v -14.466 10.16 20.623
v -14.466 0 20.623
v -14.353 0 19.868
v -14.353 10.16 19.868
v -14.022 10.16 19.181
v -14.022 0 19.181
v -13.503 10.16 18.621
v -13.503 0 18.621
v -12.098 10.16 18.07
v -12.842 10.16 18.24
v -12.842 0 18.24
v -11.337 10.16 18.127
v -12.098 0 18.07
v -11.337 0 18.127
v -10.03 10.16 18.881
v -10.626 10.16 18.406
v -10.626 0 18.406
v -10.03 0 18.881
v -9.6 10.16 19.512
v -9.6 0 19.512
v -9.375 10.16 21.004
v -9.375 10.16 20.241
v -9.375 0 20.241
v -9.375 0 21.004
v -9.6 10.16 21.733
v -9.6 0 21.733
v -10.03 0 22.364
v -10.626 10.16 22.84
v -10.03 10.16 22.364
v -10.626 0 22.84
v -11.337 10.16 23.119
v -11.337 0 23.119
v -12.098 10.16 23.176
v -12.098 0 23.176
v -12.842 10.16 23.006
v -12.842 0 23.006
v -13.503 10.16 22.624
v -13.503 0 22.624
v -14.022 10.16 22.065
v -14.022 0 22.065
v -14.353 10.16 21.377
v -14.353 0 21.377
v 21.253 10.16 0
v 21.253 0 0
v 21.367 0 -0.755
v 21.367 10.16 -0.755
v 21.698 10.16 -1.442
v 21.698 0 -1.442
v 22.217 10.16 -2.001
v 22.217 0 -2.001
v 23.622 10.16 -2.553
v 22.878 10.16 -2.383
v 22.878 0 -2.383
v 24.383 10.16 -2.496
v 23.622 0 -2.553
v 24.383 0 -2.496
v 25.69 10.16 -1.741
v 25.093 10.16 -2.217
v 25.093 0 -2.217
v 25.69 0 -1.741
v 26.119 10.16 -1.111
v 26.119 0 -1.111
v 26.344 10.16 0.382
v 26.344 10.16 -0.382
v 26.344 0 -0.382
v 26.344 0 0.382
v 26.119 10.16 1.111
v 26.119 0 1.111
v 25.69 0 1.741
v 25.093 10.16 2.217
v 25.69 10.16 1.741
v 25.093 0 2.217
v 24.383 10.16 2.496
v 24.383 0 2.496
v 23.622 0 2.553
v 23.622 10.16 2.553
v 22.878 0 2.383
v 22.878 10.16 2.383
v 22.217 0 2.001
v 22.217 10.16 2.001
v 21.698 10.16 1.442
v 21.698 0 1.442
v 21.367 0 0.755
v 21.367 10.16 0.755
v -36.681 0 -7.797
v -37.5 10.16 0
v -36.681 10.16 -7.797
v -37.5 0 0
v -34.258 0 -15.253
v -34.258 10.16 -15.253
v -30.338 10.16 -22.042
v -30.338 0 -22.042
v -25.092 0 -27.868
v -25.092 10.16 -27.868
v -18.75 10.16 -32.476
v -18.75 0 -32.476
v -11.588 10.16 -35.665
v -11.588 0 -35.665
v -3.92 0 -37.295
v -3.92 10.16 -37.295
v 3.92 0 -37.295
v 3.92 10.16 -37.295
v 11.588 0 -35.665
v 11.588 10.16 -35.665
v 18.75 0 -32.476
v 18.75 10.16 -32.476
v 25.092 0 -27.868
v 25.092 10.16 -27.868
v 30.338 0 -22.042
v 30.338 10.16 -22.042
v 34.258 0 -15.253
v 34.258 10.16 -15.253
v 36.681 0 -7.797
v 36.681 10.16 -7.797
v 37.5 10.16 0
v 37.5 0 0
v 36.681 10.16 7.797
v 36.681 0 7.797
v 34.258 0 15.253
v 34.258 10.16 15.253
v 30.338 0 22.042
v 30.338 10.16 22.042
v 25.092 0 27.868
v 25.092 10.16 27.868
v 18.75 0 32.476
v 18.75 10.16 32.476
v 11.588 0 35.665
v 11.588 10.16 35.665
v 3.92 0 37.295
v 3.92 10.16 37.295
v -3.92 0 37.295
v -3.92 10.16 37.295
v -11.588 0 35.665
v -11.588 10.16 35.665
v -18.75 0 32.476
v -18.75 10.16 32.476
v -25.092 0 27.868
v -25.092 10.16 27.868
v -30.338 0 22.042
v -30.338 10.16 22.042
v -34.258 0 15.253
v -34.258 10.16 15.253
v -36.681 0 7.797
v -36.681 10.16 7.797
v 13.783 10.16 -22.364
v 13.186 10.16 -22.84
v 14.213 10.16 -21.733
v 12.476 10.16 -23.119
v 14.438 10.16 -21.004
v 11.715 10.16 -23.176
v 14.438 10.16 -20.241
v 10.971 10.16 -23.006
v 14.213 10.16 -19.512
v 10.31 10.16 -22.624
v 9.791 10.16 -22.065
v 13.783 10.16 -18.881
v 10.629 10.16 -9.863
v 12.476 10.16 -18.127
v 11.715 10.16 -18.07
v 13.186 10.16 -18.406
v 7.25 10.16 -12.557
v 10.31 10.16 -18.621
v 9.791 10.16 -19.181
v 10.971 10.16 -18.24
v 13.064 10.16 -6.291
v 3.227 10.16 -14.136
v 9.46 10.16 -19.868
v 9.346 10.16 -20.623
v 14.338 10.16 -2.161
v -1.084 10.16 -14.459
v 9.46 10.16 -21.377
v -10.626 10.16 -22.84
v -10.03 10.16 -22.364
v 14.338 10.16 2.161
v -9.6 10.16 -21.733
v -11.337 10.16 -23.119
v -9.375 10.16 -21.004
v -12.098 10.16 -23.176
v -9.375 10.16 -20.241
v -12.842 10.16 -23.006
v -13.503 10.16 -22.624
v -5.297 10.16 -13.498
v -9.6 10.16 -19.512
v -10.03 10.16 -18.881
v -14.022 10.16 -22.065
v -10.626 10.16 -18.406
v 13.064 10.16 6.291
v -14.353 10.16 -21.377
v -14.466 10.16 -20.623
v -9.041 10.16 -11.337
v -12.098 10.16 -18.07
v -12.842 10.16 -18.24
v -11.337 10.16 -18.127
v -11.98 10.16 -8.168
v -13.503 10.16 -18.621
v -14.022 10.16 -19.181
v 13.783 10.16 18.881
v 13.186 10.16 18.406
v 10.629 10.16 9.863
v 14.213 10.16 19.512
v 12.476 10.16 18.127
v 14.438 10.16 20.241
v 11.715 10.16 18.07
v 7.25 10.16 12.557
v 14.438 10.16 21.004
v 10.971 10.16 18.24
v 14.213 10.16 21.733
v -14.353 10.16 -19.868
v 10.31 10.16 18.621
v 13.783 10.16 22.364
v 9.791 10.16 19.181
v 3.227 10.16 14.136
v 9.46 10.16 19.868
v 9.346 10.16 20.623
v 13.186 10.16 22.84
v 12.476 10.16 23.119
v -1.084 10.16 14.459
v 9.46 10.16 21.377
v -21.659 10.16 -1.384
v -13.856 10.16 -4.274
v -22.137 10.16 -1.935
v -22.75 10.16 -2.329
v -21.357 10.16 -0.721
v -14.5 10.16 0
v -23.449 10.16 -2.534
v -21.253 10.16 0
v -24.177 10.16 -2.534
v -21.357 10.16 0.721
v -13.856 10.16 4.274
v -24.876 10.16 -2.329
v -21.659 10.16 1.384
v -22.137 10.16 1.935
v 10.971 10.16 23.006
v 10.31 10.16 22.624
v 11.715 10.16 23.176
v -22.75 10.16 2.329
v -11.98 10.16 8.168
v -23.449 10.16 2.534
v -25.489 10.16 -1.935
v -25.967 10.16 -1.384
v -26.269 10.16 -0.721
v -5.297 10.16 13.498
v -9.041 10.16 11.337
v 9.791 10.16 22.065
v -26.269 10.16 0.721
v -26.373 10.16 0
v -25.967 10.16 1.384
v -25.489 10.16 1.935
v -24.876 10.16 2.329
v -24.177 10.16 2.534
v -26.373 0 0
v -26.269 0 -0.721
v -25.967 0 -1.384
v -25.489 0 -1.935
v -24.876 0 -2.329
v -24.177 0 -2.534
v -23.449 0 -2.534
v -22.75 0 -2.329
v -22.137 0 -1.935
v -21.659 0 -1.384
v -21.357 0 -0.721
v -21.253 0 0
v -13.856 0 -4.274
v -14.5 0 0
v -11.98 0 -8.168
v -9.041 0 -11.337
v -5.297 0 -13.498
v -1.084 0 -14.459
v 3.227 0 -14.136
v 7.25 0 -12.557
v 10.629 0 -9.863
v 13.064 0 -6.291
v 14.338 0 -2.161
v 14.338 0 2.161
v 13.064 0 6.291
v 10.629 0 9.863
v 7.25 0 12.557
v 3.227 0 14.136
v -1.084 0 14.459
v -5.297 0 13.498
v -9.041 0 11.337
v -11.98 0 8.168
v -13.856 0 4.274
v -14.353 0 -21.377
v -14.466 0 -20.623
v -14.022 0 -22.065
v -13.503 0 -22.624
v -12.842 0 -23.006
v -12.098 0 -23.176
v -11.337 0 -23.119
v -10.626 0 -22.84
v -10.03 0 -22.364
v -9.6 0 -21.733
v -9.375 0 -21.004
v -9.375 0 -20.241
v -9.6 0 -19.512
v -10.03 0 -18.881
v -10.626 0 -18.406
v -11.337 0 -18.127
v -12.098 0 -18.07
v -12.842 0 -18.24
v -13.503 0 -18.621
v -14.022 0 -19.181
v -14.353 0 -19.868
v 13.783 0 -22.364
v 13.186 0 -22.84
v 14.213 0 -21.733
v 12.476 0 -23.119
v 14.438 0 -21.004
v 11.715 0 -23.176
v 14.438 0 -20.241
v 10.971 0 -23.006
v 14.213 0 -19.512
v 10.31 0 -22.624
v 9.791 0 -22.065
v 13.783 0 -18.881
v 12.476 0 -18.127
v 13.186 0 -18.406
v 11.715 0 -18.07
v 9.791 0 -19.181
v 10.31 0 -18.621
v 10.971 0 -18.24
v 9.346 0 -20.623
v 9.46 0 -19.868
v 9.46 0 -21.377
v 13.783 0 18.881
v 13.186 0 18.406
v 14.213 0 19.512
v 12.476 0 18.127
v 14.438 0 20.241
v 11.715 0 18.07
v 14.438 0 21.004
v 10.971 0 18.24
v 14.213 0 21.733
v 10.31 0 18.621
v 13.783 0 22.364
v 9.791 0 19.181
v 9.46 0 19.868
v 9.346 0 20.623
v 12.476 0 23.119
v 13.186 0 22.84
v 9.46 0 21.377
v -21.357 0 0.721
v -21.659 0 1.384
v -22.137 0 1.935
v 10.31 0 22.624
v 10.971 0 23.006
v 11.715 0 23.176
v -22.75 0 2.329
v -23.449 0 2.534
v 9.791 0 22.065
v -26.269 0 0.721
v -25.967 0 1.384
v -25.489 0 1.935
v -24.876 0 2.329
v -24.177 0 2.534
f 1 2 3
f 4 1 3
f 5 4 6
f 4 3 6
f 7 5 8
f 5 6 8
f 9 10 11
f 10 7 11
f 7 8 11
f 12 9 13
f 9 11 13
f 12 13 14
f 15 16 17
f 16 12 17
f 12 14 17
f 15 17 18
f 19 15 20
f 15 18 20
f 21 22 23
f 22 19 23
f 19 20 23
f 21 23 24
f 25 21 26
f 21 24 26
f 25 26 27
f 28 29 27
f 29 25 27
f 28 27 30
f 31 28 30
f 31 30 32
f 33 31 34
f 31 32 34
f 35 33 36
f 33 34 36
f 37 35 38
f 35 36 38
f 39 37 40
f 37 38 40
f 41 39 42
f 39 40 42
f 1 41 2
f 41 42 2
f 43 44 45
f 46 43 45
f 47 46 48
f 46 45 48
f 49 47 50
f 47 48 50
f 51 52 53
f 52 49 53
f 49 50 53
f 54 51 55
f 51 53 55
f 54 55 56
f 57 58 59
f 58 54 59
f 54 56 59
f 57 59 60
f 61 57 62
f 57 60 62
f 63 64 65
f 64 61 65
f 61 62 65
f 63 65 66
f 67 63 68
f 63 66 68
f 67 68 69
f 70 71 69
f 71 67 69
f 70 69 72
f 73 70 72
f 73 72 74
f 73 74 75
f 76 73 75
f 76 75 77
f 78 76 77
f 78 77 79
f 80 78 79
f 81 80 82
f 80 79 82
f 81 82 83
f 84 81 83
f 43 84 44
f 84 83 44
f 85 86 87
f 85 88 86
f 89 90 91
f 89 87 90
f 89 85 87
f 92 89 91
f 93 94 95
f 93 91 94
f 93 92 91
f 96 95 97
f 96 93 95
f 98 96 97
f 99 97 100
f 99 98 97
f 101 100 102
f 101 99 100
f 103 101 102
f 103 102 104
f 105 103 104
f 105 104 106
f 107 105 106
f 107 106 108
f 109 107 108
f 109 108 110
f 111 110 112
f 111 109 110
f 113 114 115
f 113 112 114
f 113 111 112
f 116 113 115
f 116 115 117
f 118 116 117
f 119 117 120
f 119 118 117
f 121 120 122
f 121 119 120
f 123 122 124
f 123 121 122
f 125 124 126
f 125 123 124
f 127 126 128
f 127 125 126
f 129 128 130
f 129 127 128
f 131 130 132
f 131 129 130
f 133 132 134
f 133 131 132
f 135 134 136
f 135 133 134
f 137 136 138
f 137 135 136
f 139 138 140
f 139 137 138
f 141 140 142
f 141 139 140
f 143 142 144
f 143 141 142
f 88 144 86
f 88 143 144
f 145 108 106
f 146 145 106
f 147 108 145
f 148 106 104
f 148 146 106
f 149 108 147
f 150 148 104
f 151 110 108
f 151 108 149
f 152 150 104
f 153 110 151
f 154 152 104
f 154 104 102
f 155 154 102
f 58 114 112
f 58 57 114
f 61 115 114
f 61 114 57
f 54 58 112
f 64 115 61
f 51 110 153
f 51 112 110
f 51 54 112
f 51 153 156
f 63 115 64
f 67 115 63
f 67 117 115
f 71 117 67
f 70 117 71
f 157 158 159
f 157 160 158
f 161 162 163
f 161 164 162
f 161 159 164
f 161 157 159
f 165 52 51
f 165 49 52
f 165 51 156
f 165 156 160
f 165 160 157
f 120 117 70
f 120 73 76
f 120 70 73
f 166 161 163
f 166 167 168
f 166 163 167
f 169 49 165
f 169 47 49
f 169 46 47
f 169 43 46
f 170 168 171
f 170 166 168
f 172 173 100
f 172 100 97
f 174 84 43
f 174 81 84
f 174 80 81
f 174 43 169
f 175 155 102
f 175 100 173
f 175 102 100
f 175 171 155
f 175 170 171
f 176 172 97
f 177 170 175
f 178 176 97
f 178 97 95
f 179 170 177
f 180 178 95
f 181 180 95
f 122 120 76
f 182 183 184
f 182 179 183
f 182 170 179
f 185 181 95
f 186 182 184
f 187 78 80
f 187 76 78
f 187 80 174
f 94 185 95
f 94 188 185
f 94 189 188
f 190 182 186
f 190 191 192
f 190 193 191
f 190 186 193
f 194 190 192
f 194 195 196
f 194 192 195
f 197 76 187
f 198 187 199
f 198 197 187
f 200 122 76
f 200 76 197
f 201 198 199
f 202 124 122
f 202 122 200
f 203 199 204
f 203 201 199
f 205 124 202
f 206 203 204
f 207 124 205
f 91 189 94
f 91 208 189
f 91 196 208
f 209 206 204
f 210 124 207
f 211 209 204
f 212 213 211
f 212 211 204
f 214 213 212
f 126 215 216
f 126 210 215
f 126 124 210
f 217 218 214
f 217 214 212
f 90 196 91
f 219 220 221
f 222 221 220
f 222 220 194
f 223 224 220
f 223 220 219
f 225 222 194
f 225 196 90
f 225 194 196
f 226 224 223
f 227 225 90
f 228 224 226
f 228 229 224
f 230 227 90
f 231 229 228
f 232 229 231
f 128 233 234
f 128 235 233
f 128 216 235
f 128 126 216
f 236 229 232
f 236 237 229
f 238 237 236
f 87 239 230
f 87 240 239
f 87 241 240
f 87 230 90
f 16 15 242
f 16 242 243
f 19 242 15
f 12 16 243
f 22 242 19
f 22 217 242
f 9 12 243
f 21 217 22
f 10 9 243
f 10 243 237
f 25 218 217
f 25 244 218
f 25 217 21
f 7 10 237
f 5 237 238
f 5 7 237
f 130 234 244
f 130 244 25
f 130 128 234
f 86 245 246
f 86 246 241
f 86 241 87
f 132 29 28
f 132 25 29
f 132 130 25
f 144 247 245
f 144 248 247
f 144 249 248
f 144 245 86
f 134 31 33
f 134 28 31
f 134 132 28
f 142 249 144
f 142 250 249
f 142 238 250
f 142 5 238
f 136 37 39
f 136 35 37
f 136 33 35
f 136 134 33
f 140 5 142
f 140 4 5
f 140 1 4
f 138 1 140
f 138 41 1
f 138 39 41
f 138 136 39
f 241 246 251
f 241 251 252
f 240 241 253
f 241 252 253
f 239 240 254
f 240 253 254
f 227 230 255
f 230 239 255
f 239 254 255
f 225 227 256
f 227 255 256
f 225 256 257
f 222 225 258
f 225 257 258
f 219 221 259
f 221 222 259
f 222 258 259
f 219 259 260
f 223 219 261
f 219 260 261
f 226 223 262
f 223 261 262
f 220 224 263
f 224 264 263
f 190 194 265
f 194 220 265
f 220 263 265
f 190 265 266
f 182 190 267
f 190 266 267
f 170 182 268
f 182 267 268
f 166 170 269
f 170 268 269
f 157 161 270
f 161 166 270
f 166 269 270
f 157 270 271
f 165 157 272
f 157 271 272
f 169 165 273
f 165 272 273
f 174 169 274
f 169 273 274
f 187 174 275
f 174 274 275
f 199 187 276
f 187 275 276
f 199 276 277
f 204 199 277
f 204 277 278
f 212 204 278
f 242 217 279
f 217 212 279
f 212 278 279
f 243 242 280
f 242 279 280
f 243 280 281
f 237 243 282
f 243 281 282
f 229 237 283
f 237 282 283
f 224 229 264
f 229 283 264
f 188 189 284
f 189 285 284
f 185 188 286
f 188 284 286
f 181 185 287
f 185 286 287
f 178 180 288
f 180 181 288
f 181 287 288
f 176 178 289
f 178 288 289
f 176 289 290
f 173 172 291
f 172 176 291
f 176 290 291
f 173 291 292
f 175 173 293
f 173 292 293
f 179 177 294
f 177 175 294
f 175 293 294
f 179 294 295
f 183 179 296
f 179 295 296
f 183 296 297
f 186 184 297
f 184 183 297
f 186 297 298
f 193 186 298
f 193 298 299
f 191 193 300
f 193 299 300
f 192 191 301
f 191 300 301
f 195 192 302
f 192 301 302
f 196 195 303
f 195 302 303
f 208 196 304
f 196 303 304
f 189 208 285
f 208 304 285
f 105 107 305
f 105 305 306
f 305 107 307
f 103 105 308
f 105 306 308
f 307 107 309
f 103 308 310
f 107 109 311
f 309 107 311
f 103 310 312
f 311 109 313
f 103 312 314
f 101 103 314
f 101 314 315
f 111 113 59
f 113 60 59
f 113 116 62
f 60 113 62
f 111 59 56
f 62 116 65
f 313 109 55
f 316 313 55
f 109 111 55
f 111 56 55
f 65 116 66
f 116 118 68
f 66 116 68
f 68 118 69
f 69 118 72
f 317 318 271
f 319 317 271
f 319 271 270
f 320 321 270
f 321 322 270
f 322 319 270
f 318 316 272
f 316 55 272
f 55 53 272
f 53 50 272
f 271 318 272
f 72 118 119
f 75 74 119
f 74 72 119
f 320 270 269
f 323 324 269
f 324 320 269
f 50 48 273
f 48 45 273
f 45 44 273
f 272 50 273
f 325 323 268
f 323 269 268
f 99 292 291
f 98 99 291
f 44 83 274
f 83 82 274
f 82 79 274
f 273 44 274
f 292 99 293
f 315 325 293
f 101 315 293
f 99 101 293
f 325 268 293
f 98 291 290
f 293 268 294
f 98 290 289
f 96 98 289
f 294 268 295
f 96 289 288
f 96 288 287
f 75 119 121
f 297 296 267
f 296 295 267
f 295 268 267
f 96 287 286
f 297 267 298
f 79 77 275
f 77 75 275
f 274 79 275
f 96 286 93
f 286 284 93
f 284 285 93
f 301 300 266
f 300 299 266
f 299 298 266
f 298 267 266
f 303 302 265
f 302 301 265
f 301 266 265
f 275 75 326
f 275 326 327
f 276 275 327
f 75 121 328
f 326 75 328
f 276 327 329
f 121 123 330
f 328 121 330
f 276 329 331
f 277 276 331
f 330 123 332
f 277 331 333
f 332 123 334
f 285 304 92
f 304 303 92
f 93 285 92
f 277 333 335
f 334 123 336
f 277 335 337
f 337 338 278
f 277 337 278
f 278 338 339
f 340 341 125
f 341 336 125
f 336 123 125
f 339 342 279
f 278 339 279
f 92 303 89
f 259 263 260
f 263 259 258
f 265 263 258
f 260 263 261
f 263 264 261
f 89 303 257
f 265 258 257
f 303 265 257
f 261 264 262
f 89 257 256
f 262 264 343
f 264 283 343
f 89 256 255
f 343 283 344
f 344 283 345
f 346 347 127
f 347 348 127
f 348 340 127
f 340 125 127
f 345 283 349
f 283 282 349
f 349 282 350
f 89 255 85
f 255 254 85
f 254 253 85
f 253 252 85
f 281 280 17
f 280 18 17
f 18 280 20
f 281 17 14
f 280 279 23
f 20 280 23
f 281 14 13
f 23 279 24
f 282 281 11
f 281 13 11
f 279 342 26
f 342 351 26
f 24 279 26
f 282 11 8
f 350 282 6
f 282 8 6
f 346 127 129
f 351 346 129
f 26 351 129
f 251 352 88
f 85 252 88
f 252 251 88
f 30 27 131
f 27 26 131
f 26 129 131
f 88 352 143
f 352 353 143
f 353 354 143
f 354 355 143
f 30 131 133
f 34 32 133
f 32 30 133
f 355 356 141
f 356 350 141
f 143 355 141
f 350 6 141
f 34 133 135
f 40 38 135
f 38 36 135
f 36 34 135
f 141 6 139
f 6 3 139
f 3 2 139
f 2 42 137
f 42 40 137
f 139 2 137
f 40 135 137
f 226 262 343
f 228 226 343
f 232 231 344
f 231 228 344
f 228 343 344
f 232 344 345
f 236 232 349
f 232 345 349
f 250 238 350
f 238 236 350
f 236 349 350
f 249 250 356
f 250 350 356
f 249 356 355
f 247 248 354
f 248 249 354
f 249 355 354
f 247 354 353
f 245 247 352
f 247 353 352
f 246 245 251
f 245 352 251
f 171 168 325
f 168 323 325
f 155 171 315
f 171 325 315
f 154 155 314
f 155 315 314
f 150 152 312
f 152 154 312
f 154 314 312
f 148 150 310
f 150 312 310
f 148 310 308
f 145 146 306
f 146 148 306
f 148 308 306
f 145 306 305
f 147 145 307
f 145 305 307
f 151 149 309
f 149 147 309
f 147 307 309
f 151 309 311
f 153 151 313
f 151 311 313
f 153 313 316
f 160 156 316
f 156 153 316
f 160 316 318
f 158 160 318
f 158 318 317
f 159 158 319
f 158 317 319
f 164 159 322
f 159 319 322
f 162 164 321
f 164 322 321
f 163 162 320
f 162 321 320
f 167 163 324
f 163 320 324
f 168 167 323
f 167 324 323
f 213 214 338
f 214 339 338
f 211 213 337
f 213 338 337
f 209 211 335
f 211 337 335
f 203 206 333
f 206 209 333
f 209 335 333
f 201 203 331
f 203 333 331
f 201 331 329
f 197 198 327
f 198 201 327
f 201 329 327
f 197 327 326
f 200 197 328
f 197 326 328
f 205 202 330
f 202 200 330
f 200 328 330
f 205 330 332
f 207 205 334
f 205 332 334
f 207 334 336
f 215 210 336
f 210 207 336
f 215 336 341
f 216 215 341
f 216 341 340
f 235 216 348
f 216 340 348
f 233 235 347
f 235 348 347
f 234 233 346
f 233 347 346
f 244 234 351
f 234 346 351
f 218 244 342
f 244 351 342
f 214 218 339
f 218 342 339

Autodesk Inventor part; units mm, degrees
ref_plane "YZ Plane" through (0, 0, 0) normal (1, 0, 0) x (0, 1, 0)
ref_plane "XZ Plane" through (0, 0, 0) normal (0, 1, 0) x (-1, 0, 0)
ref_plane "XY Plane" through (0, 0, 0) normal (0, 0, 1) x (1, 0, 0)
sketch "Sketch1" plane through (0, 0, 0) normal (0, 1, 0) x (-1, 0, 0)
  circle A0 centre (0, 0) radius 37.5
  circle A1 centre (0, 0) radius 14.5
  line L0 (0, 0) -> (23.813, 0)
  circle A2 centre (23.813, 0) radius 2.56
  circle A3 centre (11.9065, 20.6227) radius 2.56
  circle A4 centre (-11.9065, 20.6227) radius 2.56
  circle A5 centre (-23.813, 0) radius 2.56
  circle A6 centre (-11.9065, -20.6227) radius 2.56
  circle A7 centre (11.9065, -20.6227) radius 2.56
  dimension "d0" = 75
  dimension "d1" = 29
  dimension "d2" = 23.813
  dimension "d3" = 5.12
  dimension "d6" = 360
extrude "Extrusion1" add sketch "Sketch1" along normal blind 10.16
properties part number "driving system S4"
